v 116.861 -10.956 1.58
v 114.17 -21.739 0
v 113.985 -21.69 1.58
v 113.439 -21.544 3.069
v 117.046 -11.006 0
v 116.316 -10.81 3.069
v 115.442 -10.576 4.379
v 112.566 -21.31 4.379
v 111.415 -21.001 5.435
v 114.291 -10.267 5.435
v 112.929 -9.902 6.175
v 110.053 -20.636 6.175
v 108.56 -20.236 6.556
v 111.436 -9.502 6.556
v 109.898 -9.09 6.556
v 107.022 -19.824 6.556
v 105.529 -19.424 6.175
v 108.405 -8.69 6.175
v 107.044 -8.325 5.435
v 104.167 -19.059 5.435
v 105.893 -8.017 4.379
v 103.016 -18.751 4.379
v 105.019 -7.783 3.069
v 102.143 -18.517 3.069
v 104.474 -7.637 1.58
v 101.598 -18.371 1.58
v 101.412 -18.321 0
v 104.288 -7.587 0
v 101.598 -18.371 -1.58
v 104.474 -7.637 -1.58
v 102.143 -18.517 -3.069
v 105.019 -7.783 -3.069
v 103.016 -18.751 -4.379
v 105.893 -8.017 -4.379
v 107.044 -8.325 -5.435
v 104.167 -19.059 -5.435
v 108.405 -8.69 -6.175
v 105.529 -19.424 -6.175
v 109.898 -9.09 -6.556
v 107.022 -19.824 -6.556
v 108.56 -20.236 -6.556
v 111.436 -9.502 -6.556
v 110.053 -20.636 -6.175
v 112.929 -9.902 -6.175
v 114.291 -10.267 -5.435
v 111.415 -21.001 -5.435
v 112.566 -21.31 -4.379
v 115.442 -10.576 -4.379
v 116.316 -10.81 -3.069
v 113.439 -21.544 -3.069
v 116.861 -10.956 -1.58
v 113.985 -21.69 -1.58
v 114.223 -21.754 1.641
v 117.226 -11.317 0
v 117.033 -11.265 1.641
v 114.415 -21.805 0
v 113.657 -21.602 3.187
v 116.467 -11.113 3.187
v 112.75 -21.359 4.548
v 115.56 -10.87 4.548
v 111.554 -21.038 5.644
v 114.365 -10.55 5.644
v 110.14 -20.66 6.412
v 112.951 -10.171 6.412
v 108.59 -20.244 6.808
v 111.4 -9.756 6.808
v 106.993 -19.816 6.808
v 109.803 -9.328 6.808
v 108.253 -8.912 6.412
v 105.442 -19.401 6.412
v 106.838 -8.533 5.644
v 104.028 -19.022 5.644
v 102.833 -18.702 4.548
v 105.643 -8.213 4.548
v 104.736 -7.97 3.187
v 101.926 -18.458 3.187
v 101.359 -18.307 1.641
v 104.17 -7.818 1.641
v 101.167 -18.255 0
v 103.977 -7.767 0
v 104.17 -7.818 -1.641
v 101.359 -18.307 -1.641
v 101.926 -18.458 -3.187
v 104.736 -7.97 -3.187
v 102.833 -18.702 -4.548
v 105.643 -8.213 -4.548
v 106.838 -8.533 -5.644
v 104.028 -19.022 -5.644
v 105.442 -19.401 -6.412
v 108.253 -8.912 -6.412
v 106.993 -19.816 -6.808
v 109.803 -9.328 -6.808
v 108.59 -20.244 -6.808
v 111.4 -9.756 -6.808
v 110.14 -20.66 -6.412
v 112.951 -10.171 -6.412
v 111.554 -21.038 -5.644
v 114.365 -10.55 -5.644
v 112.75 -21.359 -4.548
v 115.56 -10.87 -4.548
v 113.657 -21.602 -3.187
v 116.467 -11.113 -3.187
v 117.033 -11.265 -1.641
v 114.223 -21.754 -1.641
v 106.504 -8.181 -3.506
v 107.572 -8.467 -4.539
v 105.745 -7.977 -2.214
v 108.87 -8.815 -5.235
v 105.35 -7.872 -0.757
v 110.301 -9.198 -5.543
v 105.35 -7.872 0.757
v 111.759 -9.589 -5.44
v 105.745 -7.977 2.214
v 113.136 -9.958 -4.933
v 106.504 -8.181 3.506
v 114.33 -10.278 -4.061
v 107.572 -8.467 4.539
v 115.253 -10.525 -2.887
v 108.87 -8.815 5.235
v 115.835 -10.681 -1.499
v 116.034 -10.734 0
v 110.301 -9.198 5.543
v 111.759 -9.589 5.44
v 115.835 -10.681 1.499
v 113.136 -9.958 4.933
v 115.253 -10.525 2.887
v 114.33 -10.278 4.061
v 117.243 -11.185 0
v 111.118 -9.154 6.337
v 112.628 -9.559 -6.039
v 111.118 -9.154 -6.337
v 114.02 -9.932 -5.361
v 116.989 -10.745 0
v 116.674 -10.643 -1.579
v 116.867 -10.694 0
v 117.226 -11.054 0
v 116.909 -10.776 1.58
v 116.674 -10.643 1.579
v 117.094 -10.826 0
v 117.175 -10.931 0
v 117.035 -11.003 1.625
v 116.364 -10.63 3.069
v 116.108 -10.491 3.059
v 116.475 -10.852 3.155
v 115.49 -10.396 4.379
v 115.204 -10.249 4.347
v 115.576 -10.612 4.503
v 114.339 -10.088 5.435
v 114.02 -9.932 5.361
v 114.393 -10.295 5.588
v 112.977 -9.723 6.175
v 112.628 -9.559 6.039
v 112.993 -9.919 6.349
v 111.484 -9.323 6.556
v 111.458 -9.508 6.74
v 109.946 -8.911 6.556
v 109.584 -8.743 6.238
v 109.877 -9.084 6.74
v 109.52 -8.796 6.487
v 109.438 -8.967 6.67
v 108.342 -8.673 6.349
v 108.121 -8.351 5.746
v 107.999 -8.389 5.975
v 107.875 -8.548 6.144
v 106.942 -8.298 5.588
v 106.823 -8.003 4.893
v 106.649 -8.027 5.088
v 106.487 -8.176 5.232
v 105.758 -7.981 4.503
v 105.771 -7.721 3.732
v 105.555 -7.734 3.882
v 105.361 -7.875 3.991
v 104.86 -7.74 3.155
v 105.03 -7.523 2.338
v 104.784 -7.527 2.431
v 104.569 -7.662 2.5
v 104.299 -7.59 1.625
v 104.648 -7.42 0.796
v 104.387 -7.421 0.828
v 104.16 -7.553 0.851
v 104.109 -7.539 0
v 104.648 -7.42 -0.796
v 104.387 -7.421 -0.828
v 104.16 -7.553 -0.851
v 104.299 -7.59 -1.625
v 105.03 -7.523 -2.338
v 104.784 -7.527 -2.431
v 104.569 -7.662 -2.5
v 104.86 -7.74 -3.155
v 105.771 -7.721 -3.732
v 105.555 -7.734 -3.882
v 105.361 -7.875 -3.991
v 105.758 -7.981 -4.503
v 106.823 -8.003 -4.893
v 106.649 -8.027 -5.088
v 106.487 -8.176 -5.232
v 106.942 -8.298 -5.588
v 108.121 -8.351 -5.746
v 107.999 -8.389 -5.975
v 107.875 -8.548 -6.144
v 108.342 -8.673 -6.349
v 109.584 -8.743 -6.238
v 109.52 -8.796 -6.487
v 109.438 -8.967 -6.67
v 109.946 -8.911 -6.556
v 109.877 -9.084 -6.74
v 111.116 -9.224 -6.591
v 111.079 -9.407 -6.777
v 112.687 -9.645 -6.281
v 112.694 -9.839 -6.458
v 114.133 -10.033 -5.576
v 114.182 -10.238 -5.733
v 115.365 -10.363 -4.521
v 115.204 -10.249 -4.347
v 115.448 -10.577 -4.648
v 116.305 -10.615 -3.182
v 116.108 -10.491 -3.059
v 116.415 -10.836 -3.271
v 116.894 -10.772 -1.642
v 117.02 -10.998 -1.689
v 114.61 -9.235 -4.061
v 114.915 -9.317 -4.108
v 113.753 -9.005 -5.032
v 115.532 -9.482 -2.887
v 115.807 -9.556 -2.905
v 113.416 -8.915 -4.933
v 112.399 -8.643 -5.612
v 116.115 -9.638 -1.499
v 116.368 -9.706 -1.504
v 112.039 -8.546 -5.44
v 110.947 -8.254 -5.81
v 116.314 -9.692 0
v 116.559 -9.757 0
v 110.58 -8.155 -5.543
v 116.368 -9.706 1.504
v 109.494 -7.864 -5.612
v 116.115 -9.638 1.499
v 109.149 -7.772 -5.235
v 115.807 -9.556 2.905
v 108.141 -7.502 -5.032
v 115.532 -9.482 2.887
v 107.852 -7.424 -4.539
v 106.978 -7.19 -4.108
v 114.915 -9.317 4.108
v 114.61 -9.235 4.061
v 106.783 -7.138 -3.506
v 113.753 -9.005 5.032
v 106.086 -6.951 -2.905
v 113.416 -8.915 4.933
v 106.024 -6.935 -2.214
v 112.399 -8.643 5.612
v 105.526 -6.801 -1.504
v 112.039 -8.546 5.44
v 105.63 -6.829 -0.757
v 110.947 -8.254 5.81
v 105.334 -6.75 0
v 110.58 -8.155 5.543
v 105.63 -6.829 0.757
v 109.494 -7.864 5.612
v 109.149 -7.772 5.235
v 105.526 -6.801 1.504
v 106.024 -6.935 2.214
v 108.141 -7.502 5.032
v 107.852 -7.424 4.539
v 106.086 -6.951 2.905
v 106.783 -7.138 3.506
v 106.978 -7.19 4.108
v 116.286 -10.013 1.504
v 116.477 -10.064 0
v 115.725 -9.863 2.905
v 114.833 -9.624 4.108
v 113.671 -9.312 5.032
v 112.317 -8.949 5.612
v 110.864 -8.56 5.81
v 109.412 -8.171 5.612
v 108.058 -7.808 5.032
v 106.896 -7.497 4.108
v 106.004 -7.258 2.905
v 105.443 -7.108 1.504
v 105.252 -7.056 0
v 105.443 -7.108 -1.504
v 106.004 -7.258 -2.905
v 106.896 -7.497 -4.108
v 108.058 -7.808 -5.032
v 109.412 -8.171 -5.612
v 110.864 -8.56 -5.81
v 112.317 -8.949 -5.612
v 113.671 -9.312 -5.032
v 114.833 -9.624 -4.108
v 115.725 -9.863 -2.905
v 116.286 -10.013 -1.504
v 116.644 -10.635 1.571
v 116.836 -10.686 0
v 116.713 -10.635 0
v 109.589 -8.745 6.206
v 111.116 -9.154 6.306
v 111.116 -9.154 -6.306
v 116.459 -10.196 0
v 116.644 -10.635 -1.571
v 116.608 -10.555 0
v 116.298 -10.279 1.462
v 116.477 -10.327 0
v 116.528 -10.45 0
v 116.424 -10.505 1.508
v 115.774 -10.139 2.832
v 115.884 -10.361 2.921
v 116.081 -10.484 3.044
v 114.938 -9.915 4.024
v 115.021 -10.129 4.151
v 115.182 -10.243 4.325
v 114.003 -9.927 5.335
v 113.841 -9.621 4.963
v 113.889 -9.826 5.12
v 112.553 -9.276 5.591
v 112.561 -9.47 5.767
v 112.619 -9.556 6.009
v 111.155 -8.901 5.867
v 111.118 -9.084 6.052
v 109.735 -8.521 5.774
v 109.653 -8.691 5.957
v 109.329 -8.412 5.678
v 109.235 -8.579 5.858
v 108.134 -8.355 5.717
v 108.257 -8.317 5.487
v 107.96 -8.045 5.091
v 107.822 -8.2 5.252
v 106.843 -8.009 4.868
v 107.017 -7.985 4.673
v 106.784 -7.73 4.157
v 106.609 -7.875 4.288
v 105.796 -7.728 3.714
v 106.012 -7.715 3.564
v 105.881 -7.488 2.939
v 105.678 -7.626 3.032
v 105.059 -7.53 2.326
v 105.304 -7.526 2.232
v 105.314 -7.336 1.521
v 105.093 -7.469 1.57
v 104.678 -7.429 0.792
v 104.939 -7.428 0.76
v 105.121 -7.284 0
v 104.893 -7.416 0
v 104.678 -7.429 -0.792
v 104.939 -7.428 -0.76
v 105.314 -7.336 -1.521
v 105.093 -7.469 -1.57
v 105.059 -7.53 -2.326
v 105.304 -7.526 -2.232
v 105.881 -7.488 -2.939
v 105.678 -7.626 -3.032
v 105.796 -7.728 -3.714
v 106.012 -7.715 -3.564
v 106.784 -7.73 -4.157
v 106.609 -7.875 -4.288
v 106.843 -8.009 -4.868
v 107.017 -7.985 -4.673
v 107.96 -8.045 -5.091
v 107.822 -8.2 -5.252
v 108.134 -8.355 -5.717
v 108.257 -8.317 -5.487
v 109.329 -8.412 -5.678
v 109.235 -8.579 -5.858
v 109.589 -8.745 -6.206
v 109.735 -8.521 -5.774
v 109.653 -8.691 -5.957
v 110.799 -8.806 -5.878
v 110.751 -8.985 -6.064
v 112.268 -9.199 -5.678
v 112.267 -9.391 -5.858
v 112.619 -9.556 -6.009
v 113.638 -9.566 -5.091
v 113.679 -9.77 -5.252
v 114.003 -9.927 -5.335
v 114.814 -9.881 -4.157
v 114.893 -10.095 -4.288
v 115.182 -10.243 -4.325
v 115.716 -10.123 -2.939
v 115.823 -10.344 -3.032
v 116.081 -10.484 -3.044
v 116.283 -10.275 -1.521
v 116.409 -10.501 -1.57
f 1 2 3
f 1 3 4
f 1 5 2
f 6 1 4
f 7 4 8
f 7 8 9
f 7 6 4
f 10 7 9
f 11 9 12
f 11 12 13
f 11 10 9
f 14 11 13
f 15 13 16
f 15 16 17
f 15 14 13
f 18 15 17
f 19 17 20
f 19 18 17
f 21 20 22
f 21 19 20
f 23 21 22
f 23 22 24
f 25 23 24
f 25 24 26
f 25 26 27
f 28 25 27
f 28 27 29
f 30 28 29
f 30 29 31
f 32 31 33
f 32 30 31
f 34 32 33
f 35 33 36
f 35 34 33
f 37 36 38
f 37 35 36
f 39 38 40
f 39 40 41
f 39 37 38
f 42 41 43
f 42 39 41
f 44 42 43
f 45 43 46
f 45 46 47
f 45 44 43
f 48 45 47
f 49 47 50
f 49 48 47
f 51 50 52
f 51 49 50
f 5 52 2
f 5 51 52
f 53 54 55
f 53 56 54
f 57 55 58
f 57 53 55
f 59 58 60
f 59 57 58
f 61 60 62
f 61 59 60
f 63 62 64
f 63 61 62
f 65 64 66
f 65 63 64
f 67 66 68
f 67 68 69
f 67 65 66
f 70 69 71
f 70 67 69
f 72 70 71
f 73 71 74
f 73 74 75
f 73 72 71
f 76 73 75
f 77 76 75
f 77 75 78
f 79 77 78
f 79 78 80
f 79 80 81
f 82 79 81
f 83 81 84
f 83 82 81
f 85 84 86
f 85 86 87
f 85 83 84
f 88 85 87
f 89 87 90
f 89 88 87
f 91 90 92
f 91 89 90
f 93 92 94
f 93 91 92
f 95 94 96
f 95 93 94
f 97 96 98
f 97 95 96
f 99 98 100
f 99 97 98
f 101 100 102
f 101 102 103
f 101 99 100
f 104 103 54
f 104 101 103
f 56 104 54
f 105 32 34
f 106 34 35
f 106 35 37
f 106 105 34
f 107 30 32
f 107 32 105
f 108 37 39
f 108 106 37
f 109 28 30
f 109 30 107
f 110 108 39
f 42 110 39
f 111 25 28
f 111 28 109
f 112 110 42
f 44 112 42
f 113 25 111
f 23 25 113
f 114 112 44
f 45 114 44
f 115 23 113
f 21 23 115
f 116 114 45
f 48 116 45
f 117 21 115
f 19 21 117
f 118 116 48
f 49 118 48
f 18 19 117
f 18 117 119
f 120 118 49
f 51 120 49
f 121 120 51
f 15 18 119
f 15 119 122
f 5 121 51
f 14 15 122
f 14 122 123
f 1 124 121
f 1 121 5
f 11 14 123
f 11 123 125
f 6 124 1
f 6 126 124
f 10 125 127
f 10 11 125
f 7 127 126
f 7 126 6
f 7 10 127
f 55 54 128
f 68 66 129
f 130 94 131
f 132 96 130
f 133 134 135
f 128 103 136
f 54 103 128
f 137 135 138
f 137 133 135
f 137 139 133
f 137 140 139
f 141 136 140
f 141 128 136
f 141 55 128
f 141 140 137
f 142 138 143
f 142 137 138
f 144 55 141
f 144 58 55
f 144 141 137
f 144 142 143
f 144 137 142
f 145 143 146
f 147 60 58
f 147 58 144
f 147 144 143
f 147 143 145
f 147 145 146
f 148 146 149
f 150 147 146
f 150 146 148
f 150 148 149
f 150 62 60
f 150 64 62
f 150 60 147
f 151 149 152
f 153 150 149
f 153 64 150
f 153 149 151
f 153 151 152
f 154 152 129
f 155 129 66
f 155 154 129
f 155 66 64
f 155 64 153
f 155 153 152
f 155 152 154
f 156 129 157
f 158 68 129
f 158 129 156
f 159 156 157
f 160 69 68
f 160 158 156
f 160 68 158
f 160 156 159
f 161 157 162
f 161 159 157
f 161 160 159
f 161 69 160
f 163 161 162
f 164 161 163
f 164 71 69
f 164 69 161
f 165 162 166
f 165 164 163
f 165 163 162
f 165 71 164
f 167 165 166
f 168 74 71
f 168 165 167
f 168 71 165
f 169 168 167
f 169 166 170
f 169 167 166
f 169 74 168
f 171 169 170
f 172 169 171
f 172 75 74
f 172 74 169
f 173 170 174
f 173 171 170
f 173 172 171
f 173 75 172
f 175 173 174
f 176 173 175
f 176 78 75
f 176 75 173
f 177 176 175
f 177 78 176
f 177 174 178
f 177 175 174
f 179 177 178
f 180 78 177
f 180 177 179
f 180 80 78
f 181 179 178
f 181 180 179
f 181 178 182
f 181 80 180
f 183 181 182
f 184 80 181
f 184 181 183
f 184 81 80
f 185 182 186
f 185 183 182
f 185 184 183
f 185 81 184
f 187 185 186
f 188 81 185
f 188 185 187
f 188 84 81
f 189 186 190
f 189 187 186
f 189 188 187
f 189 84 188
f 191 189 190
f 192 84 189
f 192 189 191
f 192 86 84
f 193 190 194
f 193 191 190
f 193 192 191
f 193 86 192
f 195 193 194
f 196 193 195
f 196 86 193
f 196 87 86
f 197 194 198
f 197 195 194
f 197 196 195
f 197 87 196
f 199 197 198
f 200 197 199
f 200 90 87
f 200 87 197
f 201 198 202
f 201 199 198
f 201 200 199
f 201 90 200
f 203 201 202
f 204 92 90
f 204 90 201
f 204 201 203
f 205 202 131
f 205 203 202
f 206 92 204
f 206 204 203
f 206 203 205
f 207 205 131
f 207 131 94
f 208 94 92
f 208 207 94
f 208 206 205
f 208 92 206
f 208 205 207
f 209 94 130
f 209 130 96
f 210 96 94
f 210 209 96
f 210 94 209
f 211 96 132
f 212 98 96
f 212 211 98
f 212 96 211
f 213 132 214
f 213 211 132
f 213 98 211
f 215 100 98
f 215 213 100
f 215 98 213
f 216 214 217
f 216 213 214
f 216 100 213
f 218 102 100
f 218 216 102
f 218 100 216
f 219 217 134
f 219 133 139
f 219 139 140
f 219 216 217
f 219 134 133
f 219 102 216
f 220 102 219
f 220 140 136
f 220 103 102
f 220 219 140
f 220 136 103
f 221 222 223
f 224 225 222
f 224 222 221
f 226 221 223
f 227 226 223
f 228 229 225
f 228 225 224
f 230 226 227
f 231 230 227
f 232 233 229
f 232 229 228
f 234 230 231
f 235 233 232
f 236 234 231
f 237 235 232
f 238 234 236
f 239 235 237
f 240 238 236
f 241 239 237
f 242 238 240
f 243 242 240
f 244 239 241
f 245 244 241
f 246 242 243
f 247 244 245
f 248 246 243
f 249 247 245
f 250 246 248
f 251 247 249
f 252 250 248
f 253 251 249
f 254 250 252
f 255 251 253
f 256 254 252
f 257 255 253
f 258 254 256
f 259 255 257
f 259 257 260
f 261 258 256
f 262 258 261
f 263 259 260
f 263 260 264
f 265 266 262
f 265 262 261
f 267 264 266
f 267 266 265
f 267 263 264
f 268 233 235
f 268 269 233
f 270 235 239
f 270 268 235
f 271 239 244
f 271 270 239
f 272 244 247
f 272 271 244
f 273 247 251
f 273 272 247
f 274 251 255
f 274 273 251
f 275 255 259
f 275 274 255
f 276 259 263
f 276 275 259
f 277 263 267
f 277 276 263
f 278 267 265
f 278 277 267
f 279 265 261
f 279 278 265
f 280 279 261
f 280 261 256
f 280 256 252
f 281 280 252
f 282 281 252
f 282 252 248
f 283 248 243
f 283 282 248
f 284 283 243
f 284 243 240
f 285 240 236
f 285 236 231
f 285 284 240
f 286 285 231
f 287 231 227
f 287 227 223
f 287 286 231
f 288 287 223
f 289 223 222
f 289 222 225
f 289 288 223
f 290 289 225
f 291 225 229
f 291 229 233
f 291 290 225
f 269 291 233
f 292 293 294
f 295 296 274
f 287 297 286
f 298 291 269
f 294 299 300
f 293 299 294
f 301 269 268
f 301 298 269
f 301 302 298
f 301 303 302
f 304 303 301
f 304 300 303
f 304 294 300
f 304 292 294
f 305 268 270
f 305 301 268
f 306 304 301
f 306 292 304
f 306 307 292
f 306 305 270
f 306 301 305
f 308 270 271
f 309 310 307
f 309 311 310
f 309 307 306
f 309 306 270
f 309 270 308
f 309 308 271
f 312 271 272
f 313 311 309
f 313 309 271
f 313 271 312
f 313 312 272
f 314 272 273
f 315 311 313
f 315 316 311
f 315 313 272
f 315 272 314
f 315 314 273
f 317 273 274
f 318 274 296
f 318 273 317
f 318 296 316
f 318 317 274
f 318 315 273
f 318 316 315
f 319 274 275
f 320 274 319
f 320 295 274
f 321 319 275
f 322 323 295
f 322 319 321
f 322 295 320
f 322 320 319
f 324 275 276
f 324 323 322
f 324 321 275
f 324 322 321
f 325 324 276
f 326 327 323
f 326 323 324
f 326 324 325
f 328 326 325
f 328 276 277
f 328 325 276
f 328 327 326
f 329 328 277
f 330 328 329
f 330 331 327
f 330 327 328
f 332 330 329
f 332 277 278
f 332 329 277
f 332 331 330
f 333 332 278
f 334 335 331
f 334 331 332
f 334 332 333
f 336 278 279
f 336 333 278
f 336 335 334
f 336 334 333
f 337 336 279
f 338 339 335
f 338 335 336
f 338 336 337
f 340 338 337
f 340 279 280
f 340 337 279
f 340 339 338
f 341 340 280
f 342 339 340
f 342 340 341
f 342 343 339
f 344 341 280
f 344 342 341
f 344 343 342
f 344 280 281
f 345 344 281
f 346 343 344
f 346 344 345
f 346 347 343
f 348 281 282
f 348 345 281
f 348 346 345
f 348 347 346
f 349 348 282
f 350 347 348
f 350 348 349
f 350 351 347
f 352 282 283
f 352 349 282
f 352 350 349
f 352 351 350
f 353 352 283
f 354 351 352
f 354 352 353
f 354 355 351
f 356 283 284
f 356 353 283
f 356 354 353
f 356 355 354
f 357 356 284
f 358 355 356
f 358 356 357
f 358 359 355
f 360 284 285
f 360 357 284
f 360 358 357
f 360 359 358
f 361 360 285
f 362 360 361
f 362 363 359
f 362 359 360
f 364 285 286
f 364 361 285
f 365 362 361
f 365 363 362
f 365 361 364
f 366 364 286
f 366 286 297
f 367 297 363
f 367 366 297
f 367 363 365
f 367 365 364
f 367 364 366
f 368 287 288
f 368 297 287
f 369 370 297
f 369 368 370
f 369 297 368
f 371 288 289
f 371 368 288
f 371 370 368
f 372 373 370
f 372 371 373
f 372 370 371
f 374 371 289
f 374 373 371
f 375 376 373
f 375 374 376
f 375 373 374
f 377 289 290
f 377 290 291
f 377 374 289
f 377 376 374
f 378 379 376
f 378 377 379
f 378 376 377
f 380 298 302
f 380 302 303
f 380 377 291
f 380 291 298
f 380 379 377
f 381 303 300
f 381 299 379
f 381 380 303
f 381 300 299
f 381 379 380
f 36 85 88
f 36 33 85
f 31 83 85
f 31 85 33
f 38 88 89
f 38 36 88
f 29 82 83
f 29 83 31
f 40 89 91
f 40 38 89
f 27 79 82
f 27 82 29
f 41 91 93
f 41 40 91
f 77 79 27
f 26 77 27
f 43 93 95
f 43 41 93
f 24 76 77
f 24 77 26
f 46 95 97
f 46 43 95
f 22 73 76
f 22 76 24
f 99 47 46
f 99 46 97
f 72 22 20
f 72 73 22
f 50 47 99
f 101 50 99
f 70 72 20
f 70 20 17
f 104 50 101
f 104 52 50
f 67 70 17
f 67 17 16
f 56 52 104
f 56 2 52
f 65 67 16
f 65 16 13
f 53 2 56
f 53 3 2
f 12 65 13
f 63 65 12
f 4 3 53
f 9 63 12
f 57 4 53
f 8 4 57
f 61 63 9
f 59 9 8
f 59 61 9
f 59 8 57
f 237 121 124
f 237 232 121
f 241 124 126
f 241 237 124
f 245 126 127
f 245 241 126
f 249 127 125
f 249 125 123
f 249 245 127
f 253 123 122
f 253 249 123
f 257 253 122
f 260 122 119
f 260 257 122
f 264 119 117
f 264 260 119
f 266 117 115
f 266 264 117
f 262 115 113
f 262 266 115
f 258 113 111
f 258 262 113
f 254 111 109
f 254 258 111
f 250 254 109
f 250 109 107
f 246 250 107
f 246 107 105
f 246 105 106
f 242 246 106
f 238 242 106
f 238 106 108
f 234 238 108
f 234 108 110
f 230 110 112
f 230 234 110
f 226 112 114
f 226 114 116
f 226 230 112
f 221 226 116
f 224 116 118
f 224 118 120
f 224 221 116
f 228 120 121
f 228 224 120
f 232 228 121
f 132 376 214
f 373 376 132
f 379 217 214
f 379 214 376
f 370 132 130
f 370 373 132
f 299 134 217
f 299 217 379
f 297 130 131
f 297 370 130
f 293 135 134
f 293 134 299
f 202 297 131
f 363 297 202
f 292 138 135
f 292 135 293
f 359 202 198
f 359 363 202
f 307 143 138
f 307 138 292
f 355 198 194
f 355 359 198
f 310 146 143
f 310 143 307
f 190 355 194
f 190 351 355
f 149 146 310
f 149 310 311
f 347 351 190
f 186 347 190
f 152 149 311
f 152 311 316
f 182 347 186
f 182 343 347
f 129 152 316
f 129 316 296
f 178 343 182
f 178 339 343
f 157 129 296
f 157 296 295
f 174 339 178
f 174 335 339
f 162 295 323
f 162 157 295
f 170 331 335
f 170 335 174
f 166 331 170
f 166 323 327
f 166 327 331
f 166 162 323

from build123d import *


with BuildPart() as part:
    # Sketch1 → Revolve1 (revolve)
    with BuildSketch(Plane.XY):
        with BuildLine():
            Line((114.170121614, -21.739380235), (117.046248252, -11.00552949))
            Line((117.046248252, -11.00552949), (116.034199468, -10.734351836))
            Line((116.034199468, -10.734351836), (116.313594627, -9.691634906))
            Line((116.313594627, -9.691634906), (116.558939787, -9.757374944))
            Line((116.558939787, -9.757374944), (116.47676474, -10.064056394))
            ThreePointArc((116.47676474, -10.064056394), (116.527514155, -10.449536469), (116.835974985, -10.686226788))
            Line((116.835974985, -10.686226788), (116.86664313, -10.694444293))
            ThreePointArc((116.86664313, -10.694444293), (117.17510396, -10.931134613), (117.225853375, -11.316614688))
            Line((117.225853375, -11.316614688), (114.415466774, -21.805120272))
            Line((114.415466774, -21.805120272), (114.170121614, -21.739380235))
        make_face()
    revolve(axis=Axis((111.07814933, -7.762881267, 0), (-0.258819045, -0.965925826, 0)))


solid = part.part
